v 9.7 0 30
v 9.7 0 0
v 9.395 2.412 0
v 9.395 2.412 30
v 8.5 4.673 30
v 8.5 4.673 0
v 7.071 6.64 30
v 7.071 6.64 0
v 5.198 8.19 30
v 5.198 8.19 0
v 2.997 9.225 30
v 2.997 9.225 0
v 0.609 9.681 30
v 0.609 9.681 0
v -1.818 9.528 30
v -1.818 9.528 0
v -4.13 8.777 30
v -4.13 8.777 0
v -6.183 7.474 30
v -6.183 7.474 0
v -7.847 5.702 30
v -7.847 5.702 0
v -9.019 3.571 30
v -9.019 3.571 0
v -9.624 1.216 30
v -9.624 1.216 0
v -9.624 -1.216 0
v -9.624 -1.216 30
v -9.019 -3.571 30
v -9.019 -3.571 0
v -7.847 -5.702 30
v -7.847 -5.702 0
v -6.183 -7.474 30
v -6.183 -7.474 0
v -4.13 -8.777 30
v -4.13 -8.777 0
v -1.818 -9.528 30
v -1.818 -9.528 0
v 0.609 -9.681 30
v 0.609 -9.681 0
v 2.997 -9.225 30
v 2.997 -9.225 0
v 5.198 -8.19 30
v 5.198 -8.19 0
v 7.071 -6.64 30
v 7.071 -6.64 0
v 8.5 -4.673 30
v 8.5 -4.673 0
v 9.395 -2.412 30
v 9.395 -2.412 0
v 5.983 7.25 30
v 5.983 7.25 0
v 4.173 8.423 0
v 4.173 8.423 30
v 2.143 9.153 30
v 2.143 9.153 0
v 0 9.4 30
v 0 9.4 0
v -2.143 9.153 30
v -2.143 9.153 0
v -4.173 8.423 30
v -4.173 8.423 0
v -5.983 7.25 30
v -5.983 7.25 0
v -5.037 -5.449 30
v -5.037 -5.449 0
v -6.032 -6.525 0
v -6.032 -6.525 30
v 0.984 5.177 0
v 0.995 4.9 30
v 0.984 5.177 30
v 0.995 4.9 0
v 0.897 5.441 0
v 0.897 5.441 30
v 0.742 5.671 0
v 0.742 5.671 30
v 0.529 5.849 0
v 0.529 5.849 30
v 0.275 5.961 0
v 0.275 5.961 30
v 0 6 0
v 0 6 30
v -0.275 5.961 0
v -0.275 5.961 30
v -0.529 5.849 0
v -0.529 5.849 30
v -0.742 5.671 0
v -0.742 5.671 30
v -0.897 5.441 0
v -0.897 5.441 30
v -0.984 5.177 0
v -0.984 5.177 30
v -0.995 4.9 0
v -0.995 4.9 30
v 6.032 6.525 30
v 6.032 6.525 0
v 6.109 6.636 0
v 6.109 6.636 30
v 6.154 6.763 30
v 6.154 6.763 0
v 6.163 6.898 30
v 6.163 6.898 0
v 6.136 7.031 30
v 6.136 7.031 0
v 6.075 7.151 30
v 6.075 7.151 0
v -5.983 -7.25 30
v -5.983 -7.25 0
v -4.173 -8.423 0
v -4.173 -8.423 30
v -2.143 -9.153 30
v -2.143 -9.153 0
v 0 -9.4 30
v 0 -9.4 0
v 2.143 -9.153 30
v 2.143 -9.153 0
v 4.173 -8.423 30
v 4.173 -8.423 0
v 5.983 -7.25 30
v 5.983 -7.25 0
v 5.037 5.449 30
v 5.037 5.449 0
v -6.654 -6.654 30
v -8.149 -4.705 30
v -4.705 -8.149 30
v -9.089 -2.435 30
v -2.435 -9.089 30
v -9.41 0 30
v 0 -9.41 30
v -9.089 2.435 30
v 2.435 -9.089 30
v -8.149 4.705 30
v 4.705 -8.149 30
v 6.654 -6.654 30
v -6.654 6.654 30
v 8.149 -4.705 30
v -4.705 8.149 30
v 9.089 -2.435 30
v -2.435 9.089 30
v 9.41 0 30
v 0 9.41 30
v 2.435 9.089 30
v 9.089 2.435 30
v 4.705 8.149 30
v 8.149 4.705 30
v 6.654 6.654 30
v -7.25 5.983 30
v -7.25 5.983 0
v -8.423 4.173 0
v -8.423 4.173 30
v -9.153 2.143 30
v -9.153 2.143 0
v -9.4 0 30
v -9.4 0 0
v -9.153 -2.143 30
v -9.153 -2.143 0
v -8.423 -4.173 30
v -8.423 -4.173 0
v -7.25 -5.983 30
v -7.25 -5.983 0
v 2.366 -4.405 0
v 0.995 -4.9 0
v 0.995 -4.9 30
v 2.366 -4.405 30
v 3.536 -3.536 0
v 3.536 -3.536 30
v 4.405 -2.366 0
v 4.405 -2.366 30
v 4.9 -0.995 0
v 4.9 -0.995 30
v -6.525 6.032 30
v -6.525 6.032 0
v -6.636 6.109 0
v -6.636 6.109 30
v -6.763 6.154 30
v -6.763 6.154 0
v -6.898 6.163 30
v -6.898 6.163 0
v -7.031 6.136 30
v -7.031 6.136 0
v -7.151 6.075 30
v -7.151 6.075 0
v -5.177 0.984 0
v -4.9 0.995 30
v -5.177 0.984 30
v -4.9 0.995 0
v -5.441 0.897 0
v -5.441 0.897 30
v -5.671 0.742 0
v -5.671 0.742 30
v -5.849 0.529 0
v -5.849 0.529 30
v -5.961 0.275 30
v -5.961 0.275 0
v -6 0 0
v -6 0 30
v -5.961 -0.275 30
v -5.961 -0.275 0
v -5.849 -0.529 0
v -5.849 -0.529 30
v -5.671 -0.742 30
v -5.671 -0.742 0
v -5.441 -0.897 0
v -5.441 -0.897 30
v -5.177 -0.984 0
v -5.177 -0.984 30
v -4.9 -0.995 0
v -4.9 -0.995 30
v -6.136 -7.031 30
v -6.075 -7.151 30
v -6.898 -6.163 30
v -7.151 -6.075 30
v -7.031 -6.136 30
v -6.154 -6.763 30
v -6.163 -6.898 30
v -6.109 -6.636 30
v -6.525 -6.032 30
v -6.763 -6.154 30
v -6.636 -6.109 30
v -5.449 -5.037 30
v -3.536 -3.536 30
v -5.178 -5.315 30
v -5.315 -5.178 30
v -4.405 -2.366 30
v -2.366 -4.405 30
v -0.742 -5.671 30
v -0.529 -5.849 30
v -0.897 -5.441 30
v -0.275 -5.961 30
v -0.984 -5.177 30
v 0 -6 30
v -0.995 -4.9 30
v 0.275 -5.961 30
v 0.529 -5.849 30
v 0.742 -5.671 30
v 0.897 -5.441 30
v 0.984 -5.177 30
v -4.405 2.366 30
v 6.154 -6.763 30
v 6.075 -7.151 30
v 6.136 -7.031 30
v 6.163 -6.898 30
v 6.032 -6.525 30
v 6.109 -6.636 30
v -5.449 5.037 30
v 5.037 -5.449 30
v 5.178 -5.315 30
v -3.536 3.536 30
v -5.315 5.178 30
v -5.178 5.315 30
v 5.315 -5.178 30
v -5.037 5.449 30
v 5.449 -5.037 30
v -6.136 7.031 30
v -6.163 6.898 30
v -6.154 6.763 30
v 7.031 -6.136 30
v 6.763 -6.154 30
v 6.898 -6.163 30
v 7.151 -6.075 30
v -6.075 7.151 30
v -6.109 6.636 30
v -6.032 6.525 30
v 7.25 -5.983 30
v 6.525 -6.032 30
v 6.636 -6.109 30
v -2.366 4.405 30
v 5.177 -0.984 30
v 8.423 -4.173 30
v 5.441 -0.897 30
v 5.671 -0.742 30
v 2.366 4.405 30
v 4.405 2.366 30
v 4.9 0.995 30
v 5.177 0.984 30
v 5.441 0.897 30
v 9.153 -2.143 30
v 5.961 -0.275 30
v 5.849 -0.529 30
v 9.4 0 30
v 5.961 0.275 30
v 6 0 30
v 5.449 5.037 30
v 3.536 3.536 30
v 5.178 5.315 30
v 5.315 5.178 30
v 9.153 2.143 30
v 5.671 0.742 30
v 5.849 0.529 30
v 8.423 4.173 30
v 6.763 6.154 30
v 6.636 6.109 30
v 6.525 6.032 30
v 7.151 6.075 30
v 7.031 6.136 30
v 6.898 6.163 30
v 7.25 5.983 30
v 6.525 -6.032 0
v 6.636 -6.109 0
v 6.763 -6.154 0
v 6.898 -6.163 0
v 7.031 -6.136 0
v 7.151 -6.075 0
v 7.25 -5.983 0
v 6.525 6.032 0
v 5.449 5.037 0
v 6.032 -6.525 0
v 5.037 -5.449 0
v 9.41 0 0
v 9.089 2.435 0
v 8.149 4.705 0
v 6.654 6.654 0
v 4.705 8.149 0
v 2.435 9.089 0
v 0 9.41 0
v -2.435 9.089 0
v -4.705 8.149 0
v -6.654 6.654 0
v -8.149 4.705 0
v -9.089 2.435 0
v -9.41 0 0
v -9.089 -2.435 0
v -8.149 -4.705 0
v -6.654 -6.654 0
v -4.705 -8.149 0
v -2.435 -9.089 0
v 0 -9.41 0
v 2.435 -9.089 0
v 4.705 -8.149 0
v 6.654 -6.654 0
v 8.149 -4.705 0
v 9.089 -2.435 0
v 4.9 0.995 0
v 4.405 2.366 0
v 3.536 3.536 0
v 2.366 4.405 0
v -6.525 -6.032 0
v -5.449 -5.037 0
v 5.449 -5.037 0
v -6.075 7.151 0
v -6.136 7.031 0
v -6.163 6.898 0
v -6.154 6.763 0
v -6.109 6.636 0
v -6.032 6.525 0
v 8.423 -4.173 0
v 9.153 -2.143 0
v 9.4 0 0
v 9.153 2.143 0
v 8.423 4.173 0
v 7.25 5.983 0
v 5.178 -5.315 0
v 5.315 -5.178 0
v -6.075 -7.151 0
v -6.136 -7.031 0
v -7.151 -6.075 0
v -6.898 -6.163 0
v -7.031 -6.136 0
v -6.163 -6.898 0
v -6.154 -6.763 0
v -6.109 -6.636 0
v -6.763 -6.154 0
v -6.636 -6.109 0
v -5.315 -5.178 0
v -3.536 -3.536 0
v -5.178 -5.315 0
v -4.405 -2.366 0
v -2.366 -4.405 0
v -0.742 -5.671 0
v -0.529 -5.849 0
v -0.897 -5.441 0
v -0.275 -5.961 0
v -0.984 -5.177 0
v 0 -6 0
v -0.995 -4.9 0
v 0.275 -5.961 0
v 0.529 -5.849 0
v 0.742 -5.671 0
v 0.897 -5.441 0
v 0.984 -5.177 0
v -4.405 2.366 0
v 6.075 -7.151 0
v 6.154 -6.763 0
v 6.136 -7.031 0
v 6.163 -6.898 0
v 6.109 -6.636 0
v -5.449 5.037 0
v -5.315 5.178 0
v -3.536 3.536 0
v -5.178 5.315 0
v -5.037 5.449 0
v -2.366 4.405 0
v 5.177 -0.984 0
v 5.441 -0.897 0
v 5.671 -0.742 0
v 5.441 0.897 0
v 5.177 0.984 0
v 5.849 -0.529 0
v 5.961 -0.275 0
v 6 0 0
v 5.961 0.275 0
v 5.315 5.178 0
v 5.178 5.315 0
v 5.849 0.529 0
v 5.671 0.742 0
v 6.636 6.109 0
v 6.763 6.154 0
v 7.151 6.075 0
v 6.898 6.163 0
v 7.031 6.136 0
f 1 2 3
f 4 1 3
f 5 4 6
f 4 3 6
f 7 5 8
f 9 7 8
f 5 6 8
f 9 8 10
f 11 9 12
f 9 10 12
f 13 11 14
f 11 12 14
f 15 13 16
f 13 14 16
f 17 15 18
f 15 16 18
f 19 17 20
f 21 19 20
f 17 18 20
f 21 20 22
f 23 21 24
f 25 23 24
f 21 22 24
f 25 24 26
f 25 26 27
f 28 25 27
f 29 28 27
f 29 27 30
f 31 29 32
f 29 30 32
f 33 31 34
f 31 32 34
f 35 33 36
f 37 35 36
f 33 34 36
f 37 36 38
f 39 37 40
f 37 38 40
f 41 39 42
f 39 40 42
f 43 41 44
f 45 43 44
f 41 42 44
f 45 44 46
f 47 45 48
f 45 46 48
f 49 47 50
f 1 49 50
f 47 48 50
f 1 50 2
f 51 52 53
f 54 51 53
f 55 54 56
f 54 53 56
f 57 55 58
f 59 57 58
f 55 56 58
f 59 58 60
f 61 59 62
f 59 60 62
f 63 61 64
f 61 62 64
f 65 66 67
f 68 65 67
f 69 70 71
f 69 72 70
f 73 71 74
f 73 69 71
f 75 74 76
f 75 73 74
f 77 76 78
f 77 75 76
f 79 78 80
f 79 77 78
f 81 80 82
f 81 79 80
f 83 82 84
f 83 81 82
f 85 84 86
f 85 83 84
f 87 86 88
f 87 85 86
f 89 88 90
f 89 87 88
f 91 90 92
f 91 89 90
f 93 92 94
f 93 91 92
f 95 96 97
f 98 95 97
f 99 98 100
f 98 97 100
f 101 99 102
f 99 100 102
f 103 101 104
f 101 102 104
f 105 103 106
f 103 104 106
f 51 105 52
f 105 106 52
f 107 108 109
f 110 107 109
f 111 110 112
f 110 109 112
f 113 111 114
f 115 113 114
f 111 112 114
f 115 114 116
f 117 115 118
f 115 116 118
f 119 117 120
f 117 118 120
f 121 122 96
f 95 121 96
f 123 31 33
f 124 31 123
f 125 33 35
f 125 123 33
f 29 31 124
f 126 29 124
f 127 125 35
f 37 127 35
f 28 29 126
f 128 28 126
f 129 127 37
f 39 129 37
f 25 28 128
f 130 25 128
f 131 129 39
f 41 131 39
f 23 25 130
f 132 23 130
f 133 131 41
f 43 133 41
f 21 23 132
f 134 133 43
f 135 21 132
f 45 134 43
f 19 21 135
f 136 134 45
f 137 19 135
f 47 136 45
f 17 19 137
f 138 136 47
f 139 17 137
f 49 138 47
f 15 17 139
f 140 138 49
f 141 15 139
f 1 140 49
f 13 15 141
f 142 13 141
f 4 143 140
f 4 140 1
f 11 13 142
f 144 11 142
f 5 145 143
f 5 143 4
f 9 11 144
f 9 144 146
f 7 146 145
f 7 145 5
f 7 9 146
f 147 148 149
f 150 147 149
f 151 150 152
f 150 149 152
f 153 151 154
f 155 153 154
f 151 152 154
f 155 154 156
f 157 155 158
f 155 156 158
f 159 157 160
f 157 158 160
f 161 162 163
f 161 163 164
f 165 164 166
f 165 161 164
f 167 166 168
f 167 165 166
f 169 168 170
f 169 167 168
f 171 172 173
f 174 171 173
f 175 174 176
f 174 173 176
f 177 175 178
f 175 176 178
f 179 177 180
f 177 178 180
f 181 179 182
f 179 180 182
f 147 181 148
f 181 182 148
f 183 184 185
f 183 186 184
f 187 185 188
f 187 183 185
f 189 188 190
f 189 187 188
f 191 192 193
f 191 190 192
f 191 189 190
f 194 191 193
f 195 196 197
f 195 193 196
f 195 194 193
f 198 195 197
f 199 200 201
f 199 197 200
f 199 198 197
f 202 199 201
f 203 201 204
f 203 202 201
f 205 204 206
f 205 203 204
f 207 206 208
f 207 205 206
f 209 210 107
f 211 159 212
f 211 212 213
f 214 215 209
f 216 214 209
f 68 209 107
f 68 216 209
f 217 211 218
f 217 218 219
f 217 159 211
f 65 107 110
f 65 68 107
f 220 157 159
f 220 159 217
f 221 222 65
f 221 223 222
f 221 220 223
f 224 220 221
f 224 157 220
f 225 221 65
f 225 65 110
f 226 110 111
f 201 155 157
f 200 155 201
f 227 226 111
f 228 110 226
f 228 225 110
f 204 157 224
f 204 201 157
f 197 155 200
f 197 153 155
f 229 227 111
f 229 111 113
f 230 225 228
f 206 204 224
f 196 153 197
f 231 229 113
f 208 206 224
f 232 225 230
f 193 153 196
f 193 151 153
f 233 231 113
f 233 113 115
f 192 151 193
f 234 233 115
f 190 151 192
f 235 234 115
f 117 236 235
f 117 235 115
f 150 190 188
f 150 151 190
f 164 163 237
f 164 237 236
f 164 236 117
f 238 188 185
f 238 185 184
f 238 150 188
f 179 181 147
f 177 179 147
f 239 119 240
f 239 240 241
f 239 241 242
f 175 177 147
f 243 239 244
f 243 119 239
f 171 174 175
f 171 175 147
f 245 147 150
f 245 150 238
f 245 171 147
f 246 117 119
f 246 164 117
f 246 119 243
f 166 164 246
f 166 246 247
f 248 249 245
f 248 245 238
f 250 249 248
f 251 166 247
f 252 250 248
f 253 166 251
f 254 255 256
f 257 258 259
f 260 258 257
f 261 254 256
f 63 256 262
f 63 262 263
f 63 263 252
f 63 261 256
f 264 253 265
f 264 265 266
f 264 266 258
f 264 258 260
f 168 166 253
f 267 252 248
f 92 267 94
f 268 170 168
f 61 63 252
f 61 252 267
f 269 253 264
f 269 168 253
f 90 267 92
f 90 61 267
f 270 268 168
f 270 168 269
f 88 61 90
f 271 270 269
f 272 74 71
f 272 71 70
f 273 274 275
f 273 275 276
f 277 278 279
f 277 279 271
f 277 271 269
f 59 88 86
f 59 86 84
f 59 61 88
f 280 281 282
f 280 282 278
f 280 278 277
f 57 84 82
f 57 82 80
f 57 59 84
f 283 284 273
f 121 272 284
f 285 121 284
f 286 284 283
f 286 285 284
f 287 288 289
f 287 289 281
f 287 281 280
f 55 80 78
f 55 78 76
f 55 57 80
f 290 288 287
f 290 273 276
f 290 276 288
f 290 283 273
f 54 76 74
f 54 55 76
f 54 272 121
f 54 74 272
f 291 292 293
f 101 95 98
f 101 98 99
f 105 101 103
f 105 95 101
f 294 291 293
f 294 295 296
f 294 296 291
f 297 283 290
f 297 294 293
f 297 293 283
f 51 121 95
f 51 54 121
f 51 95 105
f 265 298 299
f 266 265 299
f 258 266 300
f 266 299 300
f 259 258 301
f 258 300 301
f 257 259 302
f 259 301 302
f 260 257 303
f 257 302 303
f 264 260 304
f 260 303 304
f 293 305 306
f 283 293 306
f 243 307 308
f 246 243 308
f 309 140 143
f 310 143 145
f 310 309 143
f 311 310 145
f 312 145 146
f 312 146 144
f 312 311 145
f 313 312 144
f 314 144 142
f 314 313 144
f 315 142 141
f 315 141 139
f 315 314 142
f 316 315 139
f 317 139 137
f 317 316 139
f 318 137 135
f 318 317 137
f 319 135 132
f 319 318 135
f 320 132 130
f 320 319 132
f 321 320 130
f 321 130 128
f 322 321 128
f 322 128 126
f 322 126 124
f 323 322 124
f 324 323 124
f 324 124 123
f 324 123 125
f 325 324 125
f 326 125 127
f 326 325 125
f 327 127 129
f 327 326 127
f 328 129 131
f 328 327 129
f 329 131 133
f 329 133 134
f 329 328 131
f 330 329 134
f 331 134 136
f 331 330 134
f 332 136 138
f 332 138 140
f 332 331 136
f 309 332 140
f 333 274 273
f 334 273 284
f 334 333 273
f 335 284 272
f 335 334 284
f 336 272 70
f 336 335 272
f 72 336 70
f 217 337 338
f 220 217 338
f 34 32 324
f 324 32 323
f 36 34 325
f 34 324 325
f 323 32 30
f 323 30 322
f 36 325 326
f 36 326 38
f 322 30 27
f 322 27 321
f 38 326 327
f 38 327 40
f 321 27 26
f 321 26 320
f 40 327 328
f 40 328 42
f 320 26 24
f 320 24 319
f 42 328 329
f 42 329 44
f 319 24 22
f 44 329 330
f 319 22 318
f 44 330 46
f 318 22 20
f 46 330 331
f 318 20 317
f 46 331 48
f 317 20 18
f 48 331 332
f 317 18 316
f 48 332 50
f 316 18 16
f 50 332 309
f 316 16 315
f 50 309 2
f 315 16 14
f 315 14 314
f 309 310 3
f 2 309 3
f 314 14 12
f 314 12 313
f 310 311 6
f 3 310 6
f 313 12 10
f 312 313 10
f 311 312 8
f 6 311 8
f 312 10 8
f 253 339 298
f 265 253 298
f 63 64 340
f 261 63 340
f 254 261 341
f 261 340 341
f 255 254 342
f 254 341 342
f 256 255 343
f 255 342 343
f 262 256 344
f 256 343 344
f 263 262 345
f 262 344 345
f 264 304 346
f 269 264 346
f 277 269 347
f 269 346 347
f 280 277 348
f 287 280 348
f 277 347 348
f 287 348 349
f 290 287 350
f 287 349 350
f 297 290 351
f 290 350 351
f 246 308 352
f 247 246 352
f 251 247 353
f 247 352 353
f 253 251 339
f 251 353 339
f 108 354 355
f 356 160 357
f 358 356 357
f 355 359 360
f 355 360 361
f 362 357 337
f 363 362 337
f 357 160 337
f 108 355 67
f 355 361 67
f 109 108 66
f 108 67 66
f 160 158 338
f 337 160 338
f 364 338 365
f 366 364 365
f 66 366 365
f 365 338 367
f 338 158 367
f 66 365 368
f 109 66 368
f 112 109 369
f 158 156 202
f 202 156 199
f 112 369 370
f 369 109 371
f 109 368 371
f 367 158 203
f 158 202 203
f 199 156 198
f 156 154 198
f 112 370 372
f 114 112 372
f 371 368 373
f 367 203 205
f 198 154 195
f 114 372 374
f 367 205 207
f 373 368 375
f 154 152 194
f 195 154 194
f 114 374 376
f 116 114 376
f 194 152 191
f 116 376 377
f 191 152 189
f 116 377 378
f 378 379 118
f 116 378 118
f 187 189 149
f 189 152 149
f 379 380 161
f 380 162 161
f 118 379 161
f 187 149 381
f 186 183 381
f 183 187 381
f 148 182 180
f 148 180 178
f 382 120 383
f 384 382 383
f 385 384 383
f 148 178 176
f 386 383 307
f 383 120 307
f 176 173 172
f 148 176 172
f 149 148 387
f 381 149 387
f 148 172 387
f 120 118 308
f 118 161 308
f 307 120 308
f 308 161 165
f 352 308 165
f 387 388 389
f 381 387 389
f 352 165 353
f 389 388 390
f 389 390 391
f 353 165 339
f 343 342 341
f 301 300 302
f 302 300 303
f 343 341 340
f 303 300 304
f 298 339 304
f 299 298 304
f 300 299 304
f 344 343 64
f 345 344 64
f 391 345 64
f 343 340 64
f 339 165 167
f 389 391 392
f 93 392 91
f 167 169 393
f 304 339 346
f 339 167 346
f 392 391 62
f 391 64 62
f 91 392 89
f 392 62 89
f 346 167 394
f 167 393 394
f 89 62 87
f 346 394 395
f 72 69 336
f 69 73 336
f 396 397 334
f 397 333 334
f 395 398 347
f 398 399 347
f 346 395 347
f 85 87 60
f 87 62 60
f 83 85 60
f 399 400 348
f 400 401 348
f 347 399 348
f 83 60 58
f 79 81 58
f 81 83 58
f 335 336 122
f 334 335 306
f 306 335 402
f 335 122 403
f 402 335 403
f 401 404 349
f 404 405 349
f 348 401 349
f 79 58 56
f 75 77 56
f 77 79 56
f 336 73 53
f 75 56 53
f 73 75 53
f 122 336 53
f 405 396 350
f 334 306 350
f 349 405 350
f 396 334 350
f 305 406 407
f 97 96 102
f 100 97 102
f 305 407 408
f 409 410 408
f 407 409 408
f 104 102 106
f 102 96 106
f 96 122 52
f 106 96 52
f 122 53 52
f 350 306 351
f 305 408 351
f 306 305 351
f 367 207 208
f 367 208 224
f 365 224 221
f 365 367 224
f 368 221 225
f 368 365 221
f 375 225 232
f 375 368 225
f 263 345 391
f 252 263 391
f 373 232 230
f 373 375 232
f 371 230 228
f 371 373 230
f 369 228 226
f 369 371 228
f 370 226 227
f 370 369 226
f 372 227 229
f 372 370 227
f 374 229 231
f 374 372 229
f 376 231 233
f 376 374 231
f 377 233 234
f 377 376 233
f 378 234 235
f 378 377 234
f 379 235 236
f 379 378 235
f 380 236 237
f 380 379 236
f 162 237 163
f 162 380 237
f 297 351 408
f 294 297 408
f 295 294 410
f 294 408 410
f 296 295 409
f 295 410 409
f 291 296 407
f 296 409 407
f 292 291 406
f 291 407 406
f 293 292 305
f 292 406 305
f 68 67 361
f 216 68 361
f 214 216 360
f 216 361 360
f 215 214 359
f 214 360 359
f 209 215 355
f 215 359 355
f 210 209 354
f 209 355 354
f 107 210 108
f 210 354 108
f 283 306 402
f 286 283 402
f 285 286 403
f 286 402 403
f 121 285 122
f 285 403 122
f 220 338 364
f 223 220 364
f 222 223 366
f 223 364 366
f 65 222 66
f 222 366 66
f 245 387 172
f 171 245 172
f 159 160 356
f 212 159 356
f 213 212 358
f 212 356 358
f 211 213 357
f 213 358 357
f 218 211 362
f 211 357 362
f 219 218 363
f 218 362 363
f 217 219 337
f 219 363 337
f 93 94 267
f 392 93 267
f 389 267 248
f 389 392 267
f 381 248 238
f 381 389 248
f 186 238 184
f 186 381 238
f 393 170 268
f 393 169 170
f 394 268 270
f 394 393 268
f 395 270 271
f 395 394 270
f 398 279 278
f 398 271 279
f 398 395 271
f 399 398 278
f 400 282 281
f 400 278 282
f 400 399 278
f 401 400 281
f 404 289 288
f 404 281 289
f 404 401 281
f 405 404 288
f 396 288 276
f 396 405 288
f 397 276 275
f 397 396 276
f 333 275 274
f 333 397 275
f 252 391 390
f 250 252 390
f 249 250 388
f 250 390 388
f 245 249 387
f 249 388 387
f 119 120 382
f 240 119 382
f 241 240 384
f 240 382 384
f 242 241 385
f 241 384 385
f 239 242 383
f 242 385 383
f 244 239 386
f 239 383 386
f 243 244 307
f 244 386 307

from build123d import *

# Parameters (mm, degrees)
SKETCH1_R           = 7.42
SKETCH1_R_2         = 5
BOSS_EXTRUDE1_DEPTH = 30
BOSS_EXTRUDE2_DEPTH = 30
CIRPATTERN1_COUNT   = 4
SKETCH3_R           = 9.7
SKETCH3_R_2         = 9.41
BOSS_EXTRUDE3_DEPTH = 30
SKETCH4_R           = 1
CUT_EXTRUDE2_DEPTH  = 30
CIRPATTERN2_COUNT   = 4


with BuildPart() as part:
    # Sketch1 → Boss-Extrude1 (new body)
    with BuildSketch(Plane.XY):
        Circle(SKETCH1_R)
        Circle(SKETCH1_R_2, mode=Mode.SUBTRACT)
    extrude(amount=BOSS_EXTRUDE1_DEPTH)

    # Sketch2 → Boss-Extrude2 (add)
    with BuildSketch(Plane.XY):
        with BuildLine():
            Line((5.036701532, 5.44867302), (6.031785383, 6.525148665))
            ThreePointArc((6.031785383, 6.525148665), (6.163489723, 6.898210854), (5.982861438, 7.25019786))
            ThreePointArc((5.982861438, 7.25019786), (0, 9.4), (-5.982861438, 7.25019786))
            ThreePointArc((-5.982861438, 7.25019786), (-6.163489723, 6.898210854), (-6.031785383, 6.525148665))
            Line((-6.031785383, 6.525148665), (-5.036701532, 5.44867302))
            ThreePointArc((-5.036701532, 5.44867302), (0, 7.42), (5.036701532, 5.44867302))
        make_face()
    boss_extrude2 = extrude(amount=BOSS_EXTRUDE2_DEPTH)

    # CirPattern1: Boss-Extrude2 ×4 about axis
    cirpattern1_axis = Axis((0, 0, 0), (0, 0, 1))
    for i in range(1, CIRPATTERN1_COUNT):
        add(boss_extrude2.rotate(cirpattern1_axis, i * 360 / CIRPATTERN1_COUNT))

    # Sketch4 → Cut-Extrude2 (cut)
    with BuildSketch(Plane.XY):
        with Locations((0, 5)):
            Circle(SKETCH4_R)
    cut_extrude2 = extrude(amount=CUT_EXTRUDE2_DEPTH, mode=Mode.SUBTRACT)

    # CirPattern2: Cut-Extrude2 ×4 about axis
    cirpattern2_axis = Axis((0, 0, 0), (0, 0, 1))
    for i in range(1, CIRPATTERN2_COUNT):
        add(cut_extrude2.rotate(cirpattern2_axis, i * 360 / CIRPATTERN2_COUNT), mode=Mode.SUBTRACT)


with BuildPart() as body_2:
    # Sketch3 → Boss-Extrude3 (new body)
    with BuildSketch(Plane.XY):
        Circle(SKETCH3_R)
        Circle(SKETCH3_R_2, mode=Mode.SUBTRACT)
    extrude(amount=BOSS_EXTRUDE3_DEPTH)


solid = Compound([part.part, body_2.part])
